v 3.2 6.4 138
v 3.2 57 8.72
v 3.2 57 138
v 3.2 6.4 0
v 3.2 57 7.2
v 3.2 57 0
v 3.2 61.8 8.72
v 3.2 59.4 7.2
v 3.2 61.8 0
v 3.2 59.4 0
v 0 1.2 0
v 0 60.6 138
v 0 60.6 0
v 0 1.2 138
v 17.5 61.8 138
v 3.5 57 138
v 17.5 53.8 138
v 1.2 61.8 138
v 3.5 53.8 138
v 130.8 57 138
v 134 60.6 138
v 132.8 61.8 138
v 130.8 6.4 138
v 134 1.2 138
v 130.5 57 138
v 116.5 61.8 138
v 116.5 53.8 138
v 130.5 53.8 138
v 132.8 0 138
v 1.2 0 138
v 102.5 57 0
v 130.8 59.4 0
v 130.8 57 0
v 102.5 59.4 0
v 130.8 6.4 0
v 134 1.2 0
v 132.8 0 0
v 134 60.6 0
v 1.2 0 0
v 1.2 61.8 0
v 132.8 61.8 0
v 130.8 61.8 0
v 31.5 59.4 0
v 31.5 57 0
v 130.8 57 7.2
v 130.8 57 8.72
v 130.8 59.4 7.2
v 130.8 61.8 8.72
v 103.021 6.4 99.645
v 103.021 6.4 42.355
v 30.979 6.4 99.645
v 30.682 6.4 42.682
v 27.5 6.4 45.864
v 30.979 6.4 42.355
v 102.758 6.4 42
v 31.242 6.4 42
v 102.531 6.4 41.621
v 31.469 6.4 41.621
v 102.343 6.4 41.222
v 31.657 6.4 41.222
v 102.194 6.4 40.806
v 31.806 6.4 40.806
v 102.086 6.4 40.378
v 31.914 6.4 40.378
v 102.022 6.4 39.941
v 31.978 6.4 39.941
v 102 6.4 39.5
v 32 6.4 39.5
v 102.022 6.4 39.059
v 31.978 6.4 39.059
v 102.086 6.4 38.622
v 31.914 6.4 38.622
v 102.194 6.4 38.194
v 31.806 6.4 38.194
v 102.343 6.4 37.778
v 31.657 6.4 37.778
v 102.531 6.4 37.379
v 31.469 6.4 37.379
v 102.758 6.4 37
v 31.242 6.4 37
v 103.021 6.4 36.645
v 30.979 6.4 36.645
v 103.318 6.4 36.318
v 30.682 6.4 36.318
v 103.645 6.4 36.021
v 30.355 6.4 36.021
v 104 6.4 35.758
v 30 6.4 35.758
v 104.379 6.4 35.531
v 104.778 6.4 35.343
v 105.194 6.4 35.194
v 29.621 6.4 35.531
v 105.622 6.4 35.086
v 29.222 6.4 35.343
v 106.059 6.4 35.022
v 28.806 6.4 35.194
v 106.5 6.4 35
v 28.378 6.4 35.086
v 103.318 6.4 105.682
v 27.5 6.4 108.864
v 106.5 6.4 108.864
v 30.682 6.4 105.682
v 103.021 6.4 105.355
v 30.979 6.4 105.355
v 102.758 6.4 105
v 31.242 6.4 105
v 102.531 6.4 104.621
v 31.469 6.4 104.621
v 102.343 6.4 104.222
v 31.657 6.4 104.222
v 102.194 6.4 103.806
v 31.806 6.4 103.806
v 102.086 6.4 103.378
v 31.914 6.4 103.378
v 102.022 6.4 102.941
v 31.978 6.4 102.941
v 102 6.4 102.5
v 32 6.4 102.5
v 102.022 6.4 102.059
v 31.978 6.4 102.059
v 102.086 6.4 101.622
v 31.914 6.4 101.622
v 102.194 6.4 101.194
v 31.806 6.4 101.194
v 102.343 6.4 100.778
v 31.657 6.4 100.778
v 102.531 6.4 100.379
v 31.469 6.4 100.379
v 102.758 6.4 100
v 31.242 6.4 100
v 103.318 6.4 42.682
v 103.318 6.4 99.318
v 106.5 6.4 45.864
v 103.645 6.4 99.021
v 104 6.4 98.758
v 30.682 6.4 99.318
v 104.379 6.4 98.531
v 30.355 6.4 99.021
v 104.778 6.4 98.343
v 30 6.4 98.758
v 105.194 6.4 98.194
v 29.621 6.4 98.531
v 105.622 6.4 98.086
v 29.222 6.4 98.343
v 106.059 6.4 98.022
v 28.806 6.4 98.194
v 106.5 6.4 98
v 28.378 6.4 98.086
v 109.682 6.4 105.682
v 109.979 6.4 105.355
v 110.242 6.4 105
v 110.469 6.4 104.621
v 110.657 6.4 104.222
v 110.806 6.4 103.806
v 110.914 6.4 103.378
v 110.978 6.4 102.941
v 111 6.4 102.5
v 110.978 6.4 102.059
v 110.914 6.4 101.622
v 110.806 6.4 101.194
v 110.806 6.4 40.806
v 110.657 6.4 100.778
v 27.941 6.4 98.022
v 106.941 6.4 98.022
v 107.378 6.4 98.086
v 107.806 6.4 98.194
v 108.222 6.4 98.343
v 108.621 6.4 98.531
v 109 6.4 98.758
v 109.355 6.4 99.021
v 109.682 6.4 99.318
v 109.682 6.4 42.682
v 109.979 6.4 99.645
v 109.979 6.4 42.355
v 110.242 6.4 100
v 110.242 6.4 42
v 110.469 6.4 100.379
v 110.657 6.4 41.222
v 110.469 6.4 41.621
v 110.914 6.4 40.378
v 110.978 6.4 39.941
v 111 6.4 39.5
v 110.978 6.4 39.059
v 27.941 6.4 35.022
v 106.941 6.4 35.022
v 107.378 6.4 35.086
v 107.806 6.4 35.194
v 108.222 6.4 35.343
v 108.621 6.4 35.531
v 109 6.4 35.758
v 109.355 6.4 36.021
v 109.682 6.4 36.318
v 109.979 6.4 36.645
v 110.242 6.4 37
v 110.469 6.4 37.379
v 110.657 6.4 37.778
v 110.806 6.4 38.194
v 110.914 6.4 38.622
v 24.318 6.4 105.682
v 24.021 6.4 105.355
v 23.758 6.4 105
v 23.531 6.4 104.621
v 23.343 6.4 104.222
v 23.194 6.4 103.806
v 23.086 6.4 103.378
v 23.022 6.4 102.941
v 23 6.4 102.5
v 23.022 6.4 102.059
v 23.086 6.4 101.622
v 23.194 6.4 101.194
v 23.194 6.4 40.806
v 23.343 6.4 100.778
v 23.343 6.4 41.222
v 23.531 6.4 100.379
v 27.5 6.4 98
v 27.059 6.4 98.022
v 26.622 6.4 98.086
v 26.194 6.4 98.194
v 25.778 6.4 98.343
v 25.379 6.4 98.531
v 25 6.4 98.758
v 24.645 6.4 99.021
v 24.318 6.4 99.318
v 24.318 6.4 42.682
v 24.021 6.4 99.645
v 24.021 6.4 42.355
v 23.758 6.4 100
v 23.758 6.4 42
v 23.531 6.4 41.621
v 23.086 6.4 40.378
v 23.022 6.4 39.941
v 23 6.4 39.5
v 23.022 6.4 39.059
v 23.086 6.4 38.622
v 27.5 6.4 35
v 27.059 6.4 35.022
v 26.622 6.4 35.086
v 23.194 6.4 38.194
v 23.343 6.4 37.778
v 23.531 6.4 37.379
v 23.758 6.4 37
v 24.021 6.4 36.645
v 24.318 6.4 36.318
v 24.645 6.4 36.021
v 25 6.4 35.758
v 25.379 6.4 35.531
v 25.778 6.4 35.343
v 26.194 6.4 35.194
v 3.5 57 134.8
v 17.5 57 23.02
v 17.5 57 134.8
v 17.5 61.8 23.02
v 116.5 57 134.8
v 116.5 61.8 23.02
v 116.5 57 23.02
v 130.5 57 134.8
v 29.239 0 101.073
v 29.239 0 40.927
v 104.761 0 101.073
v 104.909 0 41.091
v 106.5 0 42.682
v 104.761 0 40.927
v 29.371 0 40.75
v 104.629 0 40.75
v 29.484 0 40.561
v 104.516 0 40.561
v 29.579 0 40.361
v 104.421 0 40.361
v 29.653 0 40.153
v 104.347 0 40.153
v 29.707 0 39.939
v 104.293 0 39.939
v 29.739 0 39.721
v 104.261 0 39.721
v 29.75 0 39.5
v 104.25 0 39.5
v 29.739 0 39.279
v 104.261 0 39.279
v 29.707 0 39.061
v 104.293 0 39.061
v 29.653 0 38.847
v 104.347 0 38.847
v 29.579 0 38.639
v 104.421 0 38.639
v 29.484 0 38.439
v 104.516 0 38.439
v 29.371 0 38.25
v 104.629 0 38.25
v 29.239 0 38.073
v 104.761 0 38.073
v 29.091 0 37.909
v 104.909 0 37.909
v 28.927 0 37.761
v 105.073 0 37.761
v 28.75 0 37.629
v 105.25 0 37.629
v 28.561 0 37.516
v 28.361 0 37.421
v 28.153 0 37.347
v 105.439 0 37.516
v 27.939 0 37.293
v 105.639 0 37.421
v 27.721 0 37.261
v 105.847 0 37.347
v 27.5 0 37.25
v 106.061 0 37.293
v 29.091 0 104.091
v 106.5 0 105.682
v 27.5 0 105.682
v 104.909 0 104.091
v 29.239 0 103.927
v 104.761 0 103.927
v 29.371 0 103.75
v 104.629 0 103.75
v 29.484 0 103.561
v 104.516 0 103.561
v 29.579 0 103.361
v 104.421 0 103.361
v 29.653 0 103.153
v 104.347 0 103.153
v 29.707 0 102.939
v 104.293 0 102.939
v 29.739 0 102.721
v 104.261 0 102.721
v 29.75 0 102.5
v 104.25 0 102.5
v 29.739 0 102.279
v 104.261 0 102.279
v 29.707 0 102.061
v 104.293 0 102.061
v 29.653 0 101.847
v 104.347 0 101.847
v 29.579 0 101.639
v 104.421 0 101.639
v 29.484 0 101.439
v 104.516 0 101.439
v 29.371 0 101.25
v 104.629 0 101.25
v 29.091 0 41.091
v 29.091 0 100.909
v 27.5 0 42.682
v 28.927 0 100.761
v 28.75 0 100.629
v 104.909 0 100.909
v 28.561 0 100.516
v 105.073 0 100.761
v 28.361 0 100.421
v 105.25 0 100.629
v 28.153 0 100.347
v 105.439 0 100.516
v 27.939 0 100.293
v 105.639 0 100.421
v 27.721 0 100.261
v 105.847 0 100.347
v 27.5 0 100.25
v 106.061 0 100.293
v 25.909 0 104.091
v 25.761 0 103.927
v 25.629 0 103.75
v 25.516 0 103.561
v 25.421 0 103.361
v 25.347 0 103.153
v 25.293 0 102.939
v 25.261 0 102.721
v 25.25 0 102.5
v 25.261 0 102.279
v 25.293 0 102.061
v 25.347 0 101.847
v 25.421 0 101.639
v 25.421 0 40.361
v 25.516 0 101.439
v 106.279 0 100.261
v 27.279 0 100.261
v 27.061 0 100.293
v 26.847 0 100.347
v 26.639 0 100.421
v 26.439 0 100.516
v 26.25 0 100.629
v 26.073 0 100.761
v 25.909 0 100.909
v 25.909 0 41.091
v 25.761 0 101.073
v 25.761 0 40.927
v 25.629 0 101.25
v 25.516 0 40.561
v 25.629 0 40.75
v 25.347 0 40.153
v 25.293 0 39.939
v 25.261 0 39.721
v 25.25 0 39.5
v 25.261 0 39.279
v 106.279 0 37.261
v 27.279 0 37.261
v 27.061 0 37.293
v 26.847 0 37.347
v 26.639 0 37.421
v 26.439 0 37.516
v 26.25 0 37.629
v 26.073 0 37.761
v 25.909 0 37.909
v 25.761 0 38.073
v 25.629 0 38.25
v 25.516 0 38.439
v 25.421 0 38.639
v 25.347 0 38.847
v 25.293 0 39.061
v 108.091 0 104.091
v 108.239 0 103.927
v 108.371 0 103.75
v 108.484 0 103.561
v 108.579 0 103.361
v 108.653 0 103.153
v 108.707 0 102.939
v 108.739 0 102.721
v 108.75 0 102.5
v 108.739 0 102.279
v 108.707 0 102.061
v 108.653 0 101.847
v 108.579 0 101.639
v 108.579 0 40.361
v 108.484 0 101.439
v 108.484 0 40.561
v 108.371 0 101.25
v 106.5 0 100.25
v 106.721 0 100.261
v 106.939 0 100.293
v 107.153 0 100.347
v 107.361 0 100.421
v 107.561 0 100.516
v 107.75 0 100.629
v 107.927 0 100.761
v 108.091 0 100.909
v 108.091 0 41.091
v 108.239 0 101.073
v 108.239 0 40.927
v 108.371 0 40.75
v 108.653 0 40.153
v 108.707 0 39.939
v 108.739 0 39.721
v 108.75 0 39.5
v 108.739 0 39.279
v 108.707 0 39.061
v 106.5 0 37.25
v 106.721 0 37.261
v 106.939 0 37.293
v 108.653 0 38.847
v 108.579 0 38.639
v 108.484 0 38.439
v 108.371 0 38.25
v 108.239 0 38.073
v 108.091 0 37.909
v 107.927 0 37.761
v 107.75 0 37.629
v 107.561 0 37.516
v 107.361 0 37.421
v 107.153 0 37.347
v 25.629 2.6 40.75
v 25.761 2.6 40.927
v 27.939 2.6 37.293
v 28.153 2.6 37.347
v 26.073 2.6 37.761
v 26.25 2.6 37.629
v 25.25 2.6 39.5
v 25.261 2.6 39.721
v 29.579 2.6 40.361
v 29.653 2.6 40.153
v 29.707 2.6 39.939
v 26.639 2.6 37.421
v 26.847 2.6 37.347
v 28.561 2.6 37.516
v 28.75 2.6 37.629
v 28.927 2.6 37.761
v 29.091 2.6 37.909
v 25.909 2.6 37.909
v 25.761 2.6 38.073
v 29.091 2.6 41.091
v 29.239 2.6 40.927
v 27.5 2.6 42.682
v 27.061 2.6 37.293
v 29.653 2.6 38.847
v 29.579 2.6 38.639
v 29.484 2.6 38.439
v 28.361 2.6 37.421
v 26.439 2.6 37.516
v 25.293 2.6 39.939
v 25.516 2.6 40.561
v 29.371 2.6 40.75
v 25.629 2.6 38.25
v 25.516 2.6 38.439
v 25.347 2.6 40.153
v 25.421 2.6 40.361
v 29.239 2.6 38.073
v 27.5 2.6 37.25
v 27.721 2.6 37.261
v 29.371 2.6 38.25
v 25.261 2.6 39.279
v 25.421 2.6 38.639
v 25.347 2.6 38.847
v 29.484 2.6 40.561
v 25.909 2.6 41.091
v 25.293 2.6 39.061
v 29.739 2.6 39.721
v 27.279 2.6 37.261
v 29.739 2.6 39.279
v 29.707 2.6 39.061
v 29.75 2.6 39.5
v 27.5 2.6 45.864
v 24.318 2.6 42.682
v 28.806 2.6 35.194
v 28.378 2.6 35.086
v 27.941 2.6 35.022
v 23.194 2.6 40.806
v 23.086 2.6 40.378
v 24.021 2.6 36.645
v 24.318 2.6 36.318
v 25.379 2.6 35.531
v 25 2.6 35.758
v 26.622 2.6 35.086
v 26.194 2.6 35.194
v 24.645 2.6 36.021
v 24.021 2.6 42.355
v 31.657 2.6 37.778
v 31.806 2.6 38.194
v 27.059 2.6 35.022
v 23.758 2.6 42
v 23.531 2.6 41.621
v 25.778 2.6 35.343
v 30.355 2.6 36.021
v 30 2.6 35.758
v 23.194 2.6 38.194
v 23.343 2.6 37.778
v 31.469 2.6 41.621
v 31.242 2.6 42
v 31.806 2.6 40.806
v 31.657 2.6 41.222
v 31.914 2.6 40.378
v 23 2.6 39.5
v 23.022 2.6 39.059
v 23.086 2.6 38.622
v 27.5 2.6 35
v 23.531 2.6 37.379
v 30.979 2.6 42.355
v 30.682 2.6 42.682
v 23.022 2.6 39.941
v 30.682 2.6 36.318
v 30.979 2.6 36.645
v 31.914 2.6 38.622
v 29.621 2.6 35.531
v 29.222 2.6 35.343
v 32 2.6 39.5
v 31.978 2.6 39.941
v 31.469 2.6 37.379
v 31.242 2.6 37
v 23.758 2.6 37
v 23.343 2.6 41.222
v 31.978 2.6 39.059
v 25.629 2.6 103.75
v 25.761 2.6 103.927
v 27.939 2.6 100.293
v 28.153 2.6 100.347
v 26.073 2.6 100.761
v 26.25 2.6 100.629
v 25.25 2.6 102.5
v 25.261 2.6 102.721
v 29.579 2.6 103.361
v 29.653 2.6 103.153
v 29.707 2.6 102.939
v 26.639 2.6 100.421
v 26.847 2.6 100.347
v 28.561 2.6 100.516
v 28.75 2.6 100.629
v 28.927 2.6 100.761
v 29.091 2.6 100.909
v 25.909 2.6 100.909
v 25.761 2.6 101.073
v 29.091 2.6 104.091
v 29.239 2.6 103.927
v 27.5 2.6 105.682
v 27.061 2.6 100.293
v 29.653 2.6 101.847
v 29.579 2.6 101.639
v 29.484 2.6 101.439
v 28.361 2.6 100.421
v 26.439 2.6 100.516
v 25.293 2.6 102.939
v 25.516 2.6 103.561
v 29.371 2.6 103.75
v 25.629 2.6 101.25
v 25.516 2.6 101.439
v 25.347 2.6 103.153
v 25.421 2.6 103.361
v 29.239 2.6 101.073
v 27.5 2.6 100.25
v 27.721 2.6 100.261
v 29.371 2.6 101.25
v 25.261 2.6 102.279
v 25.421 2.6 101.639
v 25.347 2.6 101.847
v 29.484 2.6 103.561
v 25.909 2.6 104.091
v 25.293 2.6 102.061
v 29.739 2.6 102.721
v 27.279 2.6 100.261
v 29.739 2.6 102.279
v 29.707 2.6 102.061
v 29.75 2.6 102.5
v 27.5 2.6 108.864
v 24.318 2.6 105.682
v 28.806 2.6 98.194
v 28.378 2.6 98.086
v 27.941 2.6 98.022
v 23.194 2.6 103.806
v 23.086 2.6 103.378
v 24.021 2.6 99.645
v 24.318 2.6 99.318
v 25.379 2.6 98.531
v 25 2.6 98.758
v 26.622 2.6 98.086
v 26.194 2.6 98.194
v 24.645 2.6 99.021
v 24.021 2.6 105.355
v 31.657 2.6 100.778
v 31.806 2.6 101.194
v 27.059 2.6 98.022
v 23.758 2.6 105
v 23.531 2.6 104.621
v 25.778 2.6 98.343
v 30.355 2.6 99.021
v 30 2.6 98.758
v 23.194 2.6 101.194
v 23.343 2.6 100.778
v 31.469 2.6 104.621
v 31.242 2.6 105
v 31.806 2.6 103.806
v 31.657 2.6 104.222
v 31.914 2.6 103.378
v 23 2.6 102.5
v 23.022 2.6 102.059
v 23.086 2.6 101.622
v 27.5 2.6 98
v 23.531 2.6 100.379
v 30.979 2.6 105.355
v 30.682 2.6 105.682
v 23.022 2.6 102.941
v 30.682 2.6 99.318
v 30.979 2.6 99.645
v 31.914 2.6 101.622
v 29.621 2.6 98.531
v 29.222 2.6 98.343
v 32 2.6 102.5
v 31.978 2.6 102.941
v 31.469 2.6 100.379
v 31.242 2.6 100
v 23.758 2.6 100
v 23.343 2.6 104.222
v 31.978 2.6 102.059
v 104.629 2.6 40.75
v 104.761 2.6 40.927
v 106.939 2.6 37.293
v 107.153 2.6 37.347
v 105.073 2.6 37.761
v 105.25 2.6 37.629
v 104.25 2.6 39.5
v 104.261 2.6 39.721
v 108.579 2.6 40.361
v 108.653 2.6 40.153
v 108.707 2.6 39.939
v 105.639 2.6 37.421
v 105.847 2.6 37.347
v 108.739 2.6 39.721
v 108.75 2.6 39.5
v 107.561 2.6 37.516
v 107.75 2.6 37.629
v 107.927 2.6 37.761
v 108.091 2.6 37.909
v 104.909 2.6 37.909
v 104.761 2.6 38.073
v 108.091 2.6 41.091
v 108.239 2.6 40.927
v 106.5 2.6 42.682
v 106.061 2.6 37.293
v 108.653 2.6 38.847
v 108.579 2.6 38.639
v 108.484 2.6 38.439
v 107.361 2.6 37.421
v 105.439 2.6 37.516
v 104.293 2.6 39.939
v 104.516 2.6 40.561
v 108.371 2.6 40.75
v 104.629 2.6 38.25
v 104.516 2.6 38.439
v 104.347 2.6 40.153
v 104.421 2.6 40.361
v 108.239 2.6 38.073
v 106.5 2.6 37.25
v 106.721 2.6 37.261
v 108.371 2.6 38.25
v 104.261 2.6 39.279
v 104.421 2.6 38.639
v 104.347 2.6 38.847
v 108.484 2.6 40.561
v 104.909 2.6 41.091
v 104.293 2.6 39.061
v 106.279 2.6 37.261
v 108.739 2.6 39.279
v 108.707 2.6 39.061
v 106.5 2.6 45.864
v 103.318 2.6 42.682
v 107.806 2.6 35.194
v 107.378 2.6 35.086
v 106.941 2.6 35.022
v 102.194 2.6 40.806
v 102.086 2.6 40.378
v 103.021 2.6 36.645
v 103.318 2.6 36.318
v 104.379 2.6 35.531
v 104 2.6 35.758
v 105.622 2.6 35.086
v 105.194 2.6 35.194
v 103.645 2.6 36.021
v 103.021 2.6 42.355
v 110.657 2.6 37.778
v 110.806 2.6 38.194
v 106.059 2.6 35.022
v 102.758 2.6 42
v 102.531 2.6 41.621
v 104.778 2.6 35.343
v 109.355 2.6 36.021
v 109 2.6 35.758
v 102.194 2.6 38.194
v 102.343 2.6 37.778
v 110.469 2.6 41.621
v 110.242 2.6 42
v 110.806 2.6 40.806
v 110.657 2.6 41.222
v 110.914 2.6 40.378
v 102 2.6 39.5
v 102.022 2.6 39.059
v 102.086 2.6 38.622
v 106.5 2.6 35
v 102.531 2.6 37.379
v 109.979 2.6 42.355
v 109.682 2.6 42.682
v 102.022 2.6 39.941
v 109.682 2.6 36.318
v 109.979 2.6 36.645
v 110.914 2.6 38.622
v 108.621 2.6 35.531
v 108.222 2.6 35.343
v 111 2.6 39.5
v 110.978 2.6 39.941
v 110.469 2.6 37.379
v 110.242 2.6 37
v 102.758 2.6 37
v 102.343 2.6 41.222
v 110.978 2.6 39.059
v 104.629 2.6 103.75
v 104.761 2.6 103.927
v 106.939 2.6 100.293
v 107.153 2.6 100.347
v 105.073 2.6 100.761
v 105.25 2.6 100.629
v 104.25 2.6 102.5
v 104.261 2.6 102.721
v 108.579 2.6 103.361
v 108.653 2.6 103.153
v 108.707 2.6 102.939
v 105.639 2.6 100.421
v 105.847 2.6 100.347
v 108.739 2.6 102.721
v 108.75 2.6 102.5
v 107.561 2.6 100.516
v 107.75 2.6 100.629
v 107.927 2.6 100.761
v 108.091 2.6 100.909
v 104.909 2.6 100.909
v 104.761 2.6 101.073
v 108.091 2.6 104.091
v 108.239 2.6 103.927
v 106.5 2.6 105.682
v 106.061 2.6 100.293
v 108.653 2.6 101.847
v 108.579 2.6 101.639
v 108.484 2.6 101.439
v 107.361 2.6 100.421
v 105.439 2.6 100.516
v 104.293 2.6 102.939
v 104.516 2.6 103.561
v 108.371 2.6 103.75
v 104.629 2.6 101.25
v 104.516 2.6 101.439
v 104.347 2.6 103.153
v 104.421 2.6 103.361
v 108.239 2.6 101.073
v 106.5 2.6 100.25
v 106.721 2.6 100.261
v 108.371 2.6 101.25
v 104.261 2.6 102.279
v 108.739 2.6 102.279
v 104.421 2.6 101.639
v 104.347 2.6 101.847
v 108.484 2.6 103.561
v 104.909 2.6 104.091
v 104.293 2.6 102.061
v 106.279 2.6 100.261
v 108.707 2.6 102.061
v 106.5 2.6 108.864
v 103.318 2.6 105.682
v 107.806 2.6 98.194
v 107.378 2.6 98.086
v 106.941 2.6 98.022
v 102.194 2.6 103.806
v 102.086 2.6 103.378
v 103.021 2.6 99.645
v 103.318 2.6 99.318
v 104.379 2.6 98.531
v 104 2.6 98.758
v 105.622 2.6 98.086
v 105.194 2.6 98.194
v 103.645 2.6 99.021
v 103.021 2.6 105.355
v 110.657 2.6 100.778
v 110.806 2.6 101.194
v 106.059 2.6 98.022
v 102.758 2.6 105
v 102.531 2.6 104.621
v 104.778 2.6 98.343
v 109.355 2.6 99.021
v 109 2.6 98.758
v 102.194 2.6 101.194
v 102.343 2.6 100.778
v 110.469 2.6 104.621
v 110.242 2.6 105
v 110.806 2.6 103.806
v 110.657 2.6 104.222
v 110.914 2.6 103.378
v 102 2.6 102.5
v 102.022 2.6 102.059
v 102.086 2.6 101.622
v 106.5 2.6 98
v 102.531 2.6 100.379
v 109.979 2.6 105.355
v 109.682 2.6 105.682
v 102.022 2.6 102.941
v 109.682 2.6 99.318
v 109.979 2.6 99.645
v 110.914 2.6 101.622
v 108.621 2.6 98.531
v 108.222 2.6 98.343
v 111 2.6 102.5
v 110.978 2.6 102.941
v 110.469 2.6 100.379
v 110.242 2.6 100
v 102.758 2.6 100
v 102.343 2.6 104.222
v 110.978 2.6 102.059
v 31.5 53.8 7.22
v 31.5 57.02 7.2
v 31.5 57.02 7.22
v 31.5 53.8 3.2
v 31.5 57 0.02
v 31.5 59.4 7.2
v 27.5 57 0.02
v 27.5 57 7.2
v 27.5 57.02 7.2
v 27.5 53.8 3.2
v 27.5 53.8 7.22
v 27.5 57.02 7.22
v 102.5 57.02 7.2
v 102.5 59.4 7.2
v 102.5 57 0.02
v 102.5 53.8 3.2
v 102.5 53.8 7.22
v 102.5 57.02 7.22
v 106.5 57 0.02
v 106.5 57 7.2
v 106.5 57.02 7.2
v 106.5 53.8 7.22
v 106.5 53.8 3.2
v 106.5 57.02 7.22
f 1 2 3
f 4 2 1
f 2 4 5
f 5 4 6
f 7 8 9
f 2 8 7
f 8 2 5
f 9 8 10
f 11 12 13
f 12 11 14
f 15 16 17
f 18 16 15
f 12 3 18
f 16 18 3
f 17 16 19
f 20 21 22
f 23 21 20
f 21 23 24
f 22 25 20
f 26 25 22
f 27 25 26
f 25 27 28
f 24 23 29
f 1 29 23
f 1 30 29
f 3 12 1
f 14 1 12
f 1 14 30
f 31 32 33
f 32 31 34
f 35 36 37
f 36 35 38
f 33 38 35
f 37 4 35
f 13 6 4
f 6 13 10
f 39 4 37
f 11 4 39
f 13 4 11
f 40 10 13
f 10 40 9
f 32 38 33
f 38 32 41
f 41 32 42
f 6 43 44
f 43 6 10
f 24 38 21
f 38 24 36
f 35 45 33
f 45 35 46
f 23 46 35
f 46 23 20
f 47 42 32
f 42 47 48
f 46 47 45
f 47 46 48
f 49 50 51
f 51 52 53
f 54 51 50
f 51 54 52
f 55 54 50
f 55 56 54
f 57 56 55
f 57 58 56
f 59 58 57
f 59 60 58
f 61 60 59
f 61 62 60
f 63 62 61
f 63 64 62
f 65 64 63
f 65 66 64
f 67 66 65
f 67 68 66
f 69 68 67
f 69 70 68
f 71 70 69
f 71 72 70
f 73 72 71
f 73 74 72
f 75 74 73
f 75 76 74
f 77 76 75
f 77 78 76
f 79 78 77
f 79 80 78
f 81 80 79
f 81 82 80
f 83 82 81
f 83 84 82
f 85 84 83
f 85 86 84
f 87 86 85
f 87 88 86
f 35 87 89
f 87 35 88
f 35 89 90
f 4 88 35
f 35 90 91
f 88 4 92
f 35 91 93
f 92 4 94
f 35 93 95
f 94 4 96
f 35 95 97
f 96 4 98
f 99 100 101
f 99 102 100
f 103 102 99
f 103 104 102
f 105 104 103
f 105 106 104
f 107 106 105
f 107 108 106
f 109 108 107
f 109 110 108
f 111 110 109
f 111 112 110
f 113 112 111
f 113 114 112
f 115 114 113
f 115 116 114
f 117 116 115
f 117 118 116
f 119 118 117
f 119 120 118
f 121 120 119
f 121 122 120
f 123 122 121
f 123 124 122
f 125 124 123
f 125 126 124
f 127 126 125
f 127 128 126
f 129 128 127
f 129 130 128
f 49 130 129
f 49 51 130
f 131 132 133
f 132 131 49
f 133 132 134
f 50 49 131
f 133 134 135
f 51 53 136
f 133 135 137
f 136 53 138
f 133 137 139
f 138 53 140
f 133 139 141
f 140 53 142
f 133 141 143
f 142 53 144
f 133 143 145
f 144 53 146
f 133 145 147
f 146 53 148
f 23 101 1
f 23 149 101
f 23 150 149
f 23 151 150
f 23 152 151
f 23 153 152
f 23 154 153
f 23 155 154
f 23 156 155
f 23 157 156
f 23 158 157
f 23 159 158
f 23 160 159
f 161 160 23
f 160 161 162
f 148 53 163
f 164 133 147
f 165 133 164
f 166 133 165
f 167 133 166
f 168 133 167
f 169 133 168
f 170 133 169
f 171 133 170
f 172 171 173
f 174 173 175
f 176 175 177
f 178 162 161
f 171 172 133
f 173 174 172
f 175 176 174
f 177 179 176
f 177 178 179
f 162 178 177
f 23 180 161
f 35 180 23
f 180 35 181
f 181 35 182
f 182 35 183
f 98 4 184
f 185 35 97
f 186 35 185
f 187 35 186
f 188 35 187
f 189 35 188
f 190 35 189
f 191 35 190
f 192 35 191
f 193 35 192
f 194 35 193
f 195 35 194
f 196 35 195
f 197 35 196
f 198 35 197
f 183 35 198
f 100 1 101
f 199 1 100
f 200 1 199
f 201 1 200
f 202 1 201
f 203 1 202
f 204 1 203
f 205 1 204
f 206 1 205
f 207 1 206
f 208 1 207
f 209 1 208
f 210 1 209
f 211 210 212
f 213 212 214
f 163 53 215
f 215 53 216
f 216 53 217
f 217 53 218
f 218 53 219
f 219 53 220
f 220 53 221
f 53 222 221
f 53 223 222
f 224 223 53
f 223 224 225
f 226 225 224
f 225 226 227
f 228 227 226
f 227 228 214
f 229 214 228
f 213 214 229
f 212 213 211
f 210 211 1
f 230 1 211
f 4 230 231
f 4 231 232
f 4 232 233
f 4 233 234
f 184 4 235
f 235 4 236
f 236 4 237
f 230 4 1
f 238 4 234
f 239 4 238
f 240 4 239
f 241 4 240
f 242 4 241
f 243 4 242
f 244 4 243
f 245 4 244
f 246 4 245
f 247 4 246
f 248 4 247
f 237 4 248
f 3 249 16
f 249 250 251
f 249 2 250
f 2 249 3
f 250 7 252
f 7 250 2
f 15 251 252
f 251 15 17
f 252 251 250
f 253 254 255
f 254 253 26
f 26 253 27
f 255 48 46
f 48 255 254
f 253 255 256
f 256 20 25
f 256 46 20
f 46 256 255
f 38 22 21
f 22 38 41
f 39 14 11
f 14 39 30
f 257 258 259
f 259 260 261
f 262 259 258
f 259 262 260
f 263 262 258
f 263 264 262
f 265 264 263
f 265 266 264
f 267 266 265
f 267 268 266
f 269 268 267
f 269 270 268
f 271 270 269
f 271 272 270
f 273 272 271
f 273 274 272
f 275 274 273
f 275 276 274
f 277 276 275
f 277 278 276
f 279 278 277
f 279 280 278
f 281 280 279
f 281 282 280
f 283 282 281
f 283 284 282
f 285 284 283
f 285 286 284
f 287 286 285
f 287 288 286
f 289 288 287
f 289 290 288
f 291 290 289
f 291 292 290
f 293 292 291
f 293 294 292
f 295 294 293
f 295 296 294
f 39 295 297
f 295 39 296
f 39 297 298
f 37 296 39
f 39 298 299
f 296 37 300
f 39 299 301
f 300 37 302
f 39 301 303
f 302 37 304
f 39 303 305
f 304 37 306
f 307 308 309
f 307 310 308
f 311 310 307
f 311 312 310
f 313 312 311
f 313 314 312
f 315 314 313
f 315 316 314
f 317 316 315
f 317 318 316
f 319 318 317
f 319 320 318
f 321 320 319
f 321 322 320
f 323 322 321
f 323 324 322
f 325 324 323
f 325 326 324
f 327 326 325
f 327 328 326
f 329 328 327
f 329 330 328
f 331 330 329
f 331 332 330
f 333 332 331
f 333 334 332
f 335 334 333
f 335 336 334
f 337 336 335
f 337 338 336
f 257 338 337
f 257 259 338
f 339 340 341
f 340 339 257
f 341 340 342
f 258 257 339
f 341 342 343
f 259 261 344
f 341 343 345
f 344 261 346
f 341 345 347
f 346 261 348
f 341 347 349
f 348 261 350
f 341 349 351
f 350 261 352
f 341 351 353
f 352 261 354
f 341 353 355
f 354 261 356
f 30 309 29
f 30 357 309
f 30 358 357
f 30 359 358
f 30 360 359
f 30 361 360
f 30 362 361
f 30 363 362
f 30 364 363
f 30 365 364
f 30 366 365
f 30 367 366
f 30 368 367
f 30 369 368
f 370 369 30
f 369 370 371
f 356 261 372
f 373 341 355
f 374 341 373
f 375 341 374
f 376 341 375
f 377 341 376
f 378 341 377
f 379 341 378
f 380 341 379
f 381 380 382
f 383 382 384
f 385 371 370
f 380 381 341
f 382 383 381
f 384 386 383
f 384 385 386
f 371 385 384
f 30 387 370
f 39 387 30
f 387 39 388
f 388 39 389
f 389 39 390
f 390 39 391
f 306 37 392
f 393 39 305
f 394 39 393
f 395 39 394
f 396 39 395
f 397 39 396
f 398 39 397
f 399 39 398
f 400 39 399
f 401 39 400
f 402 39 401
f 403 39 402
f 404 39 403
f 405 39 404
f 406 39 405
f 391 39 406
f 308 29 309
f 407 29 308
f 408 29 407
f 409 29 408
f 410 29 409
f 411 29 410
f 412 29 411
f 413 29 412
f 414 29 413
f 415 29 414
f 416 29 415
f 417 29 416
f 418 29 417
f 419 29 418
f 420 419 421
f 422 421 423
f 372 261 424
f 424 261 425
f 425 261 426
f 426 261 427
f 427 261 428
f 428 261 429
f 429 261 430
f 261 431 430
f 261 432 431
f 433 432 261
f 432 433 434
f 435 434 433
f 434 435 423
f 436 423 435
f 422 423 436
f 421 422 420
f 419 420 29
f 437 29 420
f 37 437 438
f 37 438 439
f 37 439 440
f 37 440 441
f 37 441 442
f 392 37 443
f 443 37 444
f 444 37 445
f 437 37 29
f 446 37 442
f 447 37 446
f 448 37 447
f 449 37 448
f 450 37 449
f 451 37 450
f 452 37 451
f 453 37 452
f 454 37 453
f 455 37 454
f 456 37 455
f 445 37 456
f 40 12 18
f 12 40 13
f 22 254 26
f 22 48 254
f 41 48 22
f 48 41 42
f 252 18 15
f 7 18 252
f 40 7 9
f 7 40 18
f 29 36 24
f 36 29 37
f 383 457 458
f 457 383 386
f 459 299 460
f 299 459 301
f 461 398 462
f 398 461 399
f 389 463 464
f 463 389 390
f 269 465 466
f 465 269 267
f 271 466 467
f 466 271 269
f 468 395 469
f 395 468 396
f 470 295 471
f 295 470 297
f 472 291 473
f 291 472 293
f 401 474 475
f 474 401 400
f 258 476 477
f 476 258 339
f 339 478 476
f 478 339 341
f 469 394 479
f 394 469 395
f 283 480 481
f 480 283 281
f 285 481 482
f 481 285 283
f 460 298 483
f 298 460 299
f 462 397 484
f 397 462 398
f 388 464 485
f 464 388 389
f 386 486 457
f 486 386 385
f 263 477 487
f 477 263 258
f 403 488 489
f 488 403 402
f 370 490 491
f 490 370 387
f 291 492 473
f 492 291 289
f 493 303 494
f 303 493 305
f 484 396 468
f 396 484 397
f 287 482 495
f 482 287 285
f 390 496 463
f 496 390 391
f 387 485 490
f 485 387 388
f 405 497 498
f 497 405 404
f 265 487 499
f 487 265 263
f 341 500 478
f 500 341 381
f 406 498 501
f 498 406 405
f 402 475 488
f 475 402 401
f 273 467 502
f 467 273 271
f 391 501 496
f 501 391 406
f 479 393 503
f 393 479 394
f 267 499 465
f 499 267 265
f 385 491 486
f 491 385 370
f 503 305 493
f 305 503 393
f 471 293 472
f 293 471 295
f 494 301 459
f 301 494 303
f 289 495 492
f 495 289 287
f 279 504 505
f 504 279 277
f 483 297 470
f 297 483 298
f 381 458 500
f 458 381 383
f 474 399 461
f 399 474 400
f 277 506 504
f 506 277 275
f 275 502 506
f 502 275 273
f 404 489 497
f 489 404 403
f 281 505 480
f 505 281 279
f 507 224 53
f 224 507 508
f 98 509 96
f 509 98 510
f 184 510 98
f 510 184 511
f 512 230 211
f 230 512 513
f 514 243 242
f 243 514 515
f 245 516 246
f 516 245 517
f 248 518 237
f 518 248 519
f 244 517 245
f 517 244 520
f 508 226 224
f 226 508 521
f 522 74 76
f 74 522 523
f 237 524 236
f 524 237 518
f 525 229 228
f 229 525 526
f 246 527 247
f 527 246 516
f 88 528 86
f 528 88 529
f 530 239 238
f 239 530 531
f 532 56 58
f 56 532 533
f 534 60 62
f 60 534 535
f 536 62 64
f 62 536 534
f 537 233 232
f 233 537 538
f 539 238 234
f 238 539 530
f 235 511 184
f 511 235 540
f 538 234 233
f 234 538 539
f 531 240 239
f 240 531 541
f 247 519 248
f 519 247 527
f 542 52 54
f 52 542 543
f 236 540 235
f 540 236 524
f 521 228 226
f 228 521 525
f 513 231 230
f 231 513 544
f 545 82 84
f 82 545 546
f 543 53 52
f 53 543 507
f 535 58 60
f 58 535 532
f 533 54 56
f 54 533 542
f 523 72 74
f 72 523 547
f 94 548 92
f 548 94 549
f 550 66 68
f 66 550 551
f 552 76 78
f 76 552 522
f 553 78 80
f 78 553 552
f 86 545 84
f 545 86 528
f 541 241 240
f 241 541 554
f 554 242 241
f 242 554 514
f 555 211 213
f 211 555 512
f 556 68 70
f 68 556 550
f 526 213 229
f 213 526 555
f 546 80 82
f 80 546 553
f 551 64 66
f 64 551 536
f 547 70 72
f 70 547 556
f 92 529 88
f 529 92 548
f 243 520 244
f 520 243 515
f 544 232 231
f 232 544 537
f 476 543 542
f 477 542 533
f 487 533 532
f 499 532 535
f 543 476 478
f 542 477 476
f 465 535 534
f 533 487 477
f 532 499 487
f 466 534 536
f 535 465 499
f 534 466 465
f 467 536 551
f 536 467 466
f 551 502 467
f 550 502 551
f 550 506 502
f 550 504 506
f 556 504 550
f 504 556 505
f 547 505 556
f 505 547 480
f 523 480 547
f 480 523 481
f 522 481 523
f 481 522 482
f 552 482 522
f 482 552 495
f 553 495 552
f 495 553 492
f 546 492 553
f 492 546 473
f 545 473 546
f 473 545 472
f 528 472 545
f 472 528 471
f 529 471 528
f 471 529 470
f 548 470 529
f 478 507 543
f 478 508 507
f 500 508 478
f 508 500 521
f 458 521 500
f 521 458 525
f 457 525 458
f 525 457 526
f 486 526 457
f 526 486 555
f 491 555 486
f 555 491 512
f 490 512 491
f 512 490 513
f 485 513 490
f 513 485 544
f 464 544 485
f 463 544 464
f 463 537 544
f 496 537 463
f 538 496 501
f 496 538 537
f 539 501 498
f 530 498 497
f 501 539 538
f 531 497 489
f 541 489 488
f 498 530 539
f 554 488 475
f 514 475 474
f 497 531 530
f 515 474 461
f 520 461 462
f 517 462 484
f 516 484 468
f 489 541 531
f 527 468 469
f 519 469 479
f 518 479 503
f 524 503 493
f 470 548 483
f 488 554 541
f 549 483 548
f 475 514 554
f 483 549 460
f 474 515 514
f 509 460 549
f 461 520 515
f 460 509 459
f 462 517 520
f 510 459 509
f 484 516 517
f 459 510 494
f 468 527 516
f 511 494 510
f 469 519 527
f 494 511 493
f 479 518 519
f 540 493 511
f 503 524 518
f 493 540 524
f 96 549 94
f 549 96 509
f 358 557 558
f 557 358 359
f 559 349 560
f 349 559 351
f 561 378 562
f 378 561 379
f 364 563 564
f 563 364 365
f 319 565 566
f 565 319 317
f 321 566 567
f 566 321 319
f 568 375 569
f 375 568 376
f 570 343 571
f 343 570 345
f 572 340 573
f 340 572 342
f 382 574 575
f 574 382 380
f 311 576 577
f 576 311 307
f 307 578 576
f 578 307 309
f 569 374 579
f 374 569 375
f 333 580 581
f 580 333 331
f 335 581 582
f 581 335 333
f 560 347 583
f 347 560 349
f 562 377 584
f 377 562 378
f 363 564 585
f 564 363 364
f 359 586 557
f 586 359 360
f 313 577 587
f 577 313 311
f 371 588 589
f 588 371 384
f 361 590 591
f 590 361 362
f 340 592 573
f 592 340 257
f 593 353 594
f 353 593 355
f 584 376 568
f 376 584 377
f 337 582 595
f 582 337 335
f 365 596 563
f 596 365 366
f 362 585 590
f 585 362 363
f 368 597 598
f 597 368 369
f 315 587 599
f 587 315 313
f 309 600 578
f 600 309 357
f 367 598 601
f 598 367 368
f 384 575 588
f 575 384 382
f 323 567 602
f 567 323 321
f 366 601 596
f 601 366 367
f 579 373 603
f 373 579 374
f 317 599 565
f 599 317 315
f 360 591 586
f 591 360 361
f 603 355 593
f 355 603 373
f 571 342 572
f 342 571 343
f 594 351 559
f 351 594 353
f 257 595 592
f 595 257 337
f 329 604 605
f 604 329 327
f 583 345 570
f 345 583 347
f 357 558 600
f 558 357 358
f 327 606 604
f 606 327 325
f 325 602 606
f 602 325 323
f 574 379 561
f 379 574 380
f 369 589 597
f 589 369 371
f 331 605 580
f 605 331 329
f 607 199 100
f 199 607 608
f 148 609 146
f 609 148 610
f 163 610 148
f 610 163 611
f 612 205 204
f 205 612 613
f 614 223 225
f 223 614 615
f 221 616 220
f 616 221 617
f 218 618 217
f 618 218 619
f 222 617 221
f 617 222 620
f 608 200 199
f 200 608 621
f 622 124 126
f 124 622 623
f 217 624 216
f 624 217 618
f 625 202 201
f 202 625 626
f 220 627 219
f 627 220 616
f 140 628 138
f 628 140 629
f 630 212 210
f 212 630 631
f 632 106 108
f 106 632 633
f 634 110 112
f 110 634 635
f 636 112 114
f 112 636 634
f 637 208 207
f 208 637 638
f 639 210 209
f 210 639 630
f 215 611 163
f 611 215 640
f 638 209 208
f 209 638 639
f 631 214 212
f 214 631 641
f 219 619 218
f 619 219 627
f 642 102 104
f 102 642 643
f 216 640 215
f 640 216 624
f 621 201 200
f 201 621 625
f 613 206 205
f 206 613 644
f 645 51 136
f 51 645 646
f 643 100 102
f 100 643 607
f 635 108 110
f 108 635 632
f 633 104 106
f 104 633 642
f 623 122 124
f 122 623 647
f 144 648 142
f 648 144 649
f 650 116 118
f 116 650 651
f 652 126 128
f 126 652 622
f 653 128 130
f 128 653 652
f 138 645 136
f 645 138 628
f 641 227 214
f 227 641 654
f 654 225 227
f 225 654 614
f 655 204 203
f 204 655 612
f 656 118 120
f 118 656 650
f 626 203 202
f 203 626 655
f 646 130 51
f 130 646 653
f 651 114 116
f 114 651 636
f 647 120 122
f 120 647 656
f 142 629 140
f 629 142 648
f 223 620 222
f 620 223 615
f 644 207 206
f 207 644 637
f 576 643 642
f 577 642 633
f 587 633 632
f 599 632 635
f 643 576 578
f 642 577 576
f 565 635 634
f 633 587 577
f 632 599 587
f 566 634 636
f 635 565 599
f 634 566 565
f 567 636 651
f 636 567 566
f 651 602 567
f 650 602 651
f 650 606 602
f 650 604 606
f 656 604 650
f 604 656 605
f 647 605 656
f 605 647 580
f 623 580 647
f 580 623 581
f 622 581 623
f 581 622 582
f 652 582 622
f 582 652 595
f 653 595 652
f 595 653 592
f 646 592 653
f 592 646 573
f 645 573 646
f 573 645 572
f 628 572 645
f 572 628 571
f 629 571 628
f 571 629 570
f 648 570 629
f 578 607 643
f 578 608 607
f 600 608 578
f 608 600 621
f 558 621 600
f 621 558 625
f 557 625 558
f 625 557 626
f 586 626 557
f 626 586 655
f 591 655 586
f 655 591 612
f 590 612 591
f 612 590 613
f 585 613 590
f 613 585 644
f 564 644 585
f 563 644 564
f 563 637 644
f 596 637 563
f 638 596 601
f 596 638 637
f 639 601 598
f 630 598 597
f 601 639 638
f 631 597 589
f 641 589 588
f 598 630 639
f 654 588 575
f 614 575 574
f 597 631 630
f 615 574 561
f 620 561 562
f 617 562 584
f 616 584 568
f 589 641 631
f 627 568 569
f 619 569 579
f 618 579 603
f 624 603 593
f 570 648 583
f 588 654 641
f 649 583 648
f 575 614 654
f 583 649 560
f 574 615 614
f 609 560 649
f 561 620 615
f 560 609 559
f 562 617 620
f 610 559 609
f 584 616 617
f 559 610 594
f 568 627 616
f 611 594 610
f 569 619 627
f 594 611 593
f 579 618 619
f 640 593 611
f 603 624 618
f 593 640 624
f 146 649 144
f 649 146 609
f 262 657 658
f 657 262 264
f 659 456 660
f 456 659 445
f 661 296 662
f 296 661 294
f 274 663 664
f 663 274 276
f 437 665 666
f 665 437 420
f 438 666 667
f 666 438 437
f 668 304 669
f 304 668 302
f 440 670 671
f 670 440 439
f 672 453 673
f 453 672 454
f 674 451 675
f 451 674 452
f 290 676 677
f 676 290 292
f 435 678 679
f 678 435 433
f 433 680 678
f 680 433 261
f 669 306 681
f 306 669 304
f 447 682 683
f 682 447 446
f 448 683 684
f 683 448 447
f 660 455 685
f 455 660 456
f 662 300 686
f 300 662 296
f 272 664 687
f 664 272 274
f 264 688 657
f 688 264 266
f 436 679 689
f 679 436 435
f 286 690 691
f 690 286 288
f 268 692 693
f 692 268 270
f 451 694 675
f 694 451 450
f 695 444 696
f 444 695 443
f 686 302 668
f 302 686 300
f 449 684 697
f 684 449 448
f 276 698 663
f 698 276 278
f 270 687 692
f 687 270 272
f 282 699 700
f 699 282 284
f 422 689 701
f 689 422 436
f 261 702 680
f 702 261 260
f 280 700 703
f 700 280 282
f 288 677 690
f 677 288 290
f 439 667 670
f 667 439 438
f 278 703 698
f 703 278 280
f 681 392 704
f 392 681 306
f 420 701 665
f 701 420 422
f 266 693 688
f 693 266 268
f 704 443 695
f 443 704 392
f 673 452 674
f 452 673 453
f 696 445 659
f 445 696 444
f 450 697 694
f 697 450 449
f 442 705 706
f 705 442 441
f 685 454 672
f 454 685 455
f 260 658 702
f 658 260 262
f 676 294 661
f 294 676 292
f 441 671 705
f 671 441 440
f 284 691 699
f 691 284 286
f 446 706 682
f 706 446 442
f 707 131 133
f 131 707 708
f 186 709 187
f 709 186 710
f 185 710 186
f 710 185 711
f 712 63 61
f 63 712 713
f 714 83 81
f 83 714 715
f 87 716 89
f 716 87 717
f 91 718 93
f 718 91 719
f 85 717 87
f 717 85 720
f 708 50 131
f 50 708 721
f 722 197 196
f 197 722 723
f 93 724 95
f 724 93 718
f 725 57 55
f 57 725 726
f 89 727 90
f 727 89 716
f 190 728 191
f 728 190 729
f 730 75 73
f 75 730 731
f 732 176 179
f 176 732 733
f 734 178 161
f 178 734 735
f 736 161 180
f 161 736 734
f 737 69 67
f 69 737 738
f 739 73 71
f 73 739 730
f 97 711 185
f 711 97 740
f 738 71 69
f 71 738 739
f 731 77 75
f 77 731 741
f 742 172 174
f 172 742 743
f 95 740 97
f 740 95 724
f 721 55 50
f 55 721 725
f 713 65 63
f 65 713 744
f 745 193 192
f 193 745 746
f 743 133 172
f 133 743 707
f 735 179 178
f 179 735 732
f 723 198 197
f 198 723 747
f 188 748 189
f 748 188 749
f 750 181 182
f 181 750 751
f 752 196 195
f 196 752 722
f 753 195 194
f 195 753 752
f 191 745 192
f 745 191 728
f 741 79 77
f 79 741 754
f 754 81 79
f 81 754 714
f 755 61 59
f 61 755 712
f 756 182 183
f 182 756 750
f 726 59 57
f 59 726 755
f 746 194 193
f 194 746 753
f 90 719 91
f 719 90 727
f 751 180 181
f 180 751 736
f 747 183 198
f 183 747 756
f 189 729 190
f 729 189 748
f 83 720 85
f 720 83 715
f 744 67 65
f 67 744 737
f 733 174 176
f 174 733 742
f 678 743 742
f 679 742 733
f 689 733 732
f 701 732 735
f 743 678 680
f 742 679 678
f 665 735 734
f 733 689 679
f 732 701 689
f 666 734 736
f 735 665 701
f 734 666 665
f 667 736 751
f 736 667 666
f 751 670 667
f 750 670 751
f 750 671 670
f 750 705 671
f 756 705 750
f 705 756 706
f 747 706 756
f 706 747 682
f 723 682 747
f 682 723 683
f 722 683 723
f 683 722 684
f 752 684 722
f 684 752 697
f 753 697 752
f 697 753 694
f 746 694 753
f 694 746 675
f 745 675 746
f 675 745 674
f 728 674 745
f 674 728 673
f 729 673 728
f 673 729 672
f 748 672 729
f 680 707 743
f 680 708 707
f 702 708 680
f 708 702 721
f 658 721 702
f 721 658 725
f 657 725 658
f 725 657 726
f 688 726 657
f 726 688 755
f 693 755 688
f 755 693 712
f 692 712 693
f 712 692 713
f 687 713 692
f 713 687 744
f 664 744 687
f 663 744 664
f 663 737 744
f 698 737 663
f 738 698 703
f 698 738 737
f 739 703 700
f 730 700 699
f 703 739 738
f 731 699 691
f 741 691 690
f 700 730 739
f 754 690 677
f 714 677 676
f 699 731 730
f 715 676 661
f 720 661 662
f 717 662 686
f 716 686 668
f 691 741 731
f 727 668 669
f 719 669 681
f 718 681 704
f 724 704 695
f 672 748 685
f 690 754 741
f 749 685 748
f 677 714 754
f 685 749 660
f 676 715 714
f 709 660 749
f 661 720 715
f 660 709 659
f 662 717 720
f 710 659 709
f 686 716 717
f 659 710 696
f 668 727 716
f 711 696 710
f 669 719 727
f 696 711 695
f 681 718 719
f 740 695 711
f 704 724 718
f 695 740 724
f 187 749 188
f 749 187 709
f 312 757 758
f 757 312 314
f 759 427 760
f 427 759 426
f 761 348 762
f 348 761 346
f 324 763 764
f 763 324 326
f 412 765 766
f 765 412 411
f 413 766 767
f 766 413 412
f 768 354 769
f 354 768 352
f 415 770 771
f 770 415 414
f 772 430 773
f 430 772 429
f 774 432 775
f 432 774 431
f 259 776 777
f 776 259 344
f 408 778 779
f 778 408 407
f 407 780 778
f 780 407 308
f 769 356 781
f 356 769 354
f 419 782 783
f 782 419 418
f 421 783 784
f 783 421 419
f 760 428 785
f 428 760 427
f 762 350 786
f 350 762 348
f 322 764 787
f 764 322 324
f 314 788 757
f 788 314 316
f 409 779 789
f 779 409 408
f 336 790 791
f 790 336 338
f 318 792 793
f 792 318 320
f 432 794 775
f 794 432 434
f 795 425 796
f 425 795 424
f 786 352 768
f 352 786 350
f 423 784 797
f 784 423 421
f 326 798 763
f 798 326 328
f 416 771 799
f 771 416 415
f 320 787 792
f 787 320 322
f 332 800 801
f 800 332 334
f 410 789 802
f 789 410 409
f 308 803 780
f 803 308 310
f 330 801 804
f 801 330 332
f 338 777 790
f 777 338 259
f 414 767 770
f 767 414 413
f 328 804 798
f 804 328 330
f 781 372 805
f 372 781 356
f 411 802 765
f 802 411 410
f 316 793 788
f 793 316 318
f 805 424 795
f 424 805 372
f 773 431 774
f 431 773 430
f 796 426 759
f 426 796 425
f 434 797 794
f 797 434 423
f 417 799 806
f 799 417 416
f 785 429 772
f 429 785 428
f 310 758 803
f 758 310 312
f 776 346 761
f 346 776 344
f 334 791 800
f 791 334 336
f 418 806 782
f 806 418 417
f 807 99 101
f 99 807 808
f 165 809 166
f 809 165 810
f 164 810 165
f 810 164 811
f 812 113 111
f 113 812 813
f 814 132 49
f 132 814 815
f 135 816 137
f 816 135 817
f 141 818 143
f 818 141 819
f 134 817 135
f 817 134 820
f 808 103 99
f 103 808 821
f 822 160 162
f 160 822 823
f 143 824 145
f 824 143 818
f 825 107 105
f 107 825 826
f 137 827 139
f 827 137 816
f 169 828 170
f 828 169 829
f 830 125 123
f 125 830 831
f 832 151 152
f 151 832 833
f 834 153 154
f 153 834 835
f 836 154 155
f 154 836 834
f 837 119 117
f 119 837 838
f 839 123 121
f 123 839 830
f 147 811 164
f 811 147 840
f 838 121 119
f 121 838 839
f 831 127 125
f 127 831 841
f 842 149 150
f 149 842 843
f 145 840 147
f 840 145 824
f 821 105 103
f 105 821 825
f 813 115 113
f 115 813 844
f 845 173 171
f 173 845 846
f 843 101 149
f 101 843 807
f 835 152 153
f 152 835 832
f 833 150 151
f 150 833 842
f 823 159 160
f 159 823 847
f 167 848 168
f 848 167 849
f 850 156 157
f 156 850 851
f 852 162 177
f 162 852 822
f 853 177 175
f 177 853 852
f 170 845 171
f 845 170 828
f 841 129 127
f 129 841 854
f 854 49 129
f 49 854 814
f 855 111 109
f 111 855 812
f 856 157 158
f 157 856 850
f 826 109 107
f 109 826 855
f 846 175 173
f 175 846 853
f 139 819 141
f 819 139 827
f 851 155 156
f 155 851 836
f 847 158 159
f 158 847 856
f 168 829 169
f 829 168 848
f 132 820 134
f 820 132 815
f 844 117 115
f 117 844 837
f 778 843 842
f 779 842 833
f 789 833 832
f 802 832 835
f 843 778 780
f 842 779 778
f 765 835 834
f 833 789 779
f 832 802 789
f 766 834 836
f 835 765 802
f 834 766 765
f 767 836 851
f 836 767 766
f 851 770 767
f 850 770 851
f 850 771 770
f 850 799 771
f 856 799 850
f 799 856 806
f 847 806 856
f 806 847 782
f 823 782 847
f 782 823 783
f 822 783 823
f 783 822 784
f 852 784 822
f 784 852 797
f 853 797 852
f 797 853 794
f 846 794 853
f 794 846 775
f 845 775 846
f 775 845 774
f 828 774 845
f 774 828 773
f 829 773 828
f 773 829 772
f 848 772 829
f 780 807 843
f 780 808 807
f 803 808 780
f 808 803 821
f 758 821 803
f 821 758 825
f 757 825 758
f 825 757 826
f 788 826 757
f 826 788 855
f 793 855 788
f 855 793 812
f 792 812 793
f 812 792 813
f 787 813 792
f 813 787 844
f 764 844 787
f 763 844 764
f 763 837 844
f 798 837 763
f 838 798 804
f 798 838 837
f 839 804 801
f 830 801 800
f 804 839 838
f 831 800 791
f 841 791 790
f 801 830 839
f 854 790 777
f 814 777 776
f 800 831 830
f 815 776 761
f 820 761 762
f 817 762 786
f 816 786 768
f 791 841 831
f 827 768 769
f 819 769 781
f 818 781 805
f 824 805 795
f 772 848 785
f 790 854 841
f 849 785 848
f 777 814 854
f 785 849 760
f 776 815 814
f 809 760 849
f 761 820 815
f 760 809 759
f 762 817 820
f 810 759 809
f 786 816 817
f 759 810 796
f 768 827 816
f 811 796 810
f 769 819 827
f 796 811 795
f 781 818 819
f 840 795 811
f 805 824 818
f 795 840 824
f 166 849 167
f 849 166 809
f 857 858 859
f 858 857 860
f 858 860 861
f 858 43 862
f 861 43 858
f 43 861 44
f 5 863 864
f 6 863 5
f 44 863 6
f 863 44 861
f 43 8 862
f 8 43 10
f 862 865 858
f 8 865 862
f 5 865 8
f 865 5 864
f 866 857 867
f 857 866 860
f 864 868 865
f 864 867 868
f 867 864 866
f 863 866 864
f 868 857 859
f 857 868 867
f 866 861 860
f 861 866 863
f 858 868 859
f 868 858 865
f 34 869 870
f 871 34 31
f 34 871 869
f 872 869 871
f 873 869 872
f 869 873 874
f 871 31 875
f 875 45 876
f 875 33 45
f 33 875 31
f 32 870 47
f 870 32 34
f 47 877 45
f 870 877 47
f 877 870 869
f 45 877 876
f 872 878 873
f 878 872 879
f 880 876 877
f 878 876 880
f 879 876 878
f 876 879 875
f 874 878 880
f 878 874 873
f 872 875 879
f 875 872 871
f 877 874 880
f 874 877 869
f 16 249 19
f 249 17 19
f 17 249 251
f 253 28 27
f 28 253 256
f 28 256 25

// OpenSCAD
// Reference design by GPT-6.1 Sol, smoothstone gold set (e07_mac_mini_mount). Copied as made; the recipes adapt it.
// Millimeters. Product coordinates: x width, y front to back, z upward.
body_w = 127.0;       // product.body.w
body_d = 127.0;       // product.body.d
body_h = 50.0;        // product.body.h
body_corner_r = 0.0;  // product.body.corner_r: enclosing box, no published radius
design_load = 20;     // expect.load_n, N
safety = 2;           // expect.safety

// Design values, not measurements of the computer. Reasons are in NOTES.md.
gap = 0.30;
side = 3.20;
roof = 6.40;
rail_t = 4.80;
rail_in = 14.0;
front = -7.50;
rear = body_d + gap + 3.2;
edge_chamfer = 1.20;
snap_t = 2.40;
snap_w = 7.20;
snap_root_x = -0.20;
snap_tip_x = 28.0;
snap_l = snap_tip_x - snap_root_x;
snap_rise = 3.20;
snap_tip_land = 4.0;
snap_ramp = 3.20;
snap_rear = front + snap_w;
rail_front = snap_rear + 1.50;
bore_d = 4.50;        // expect.attach.screw M4: ISO 273 medium, cited in spec
head_d = 9.00;        // 8.2 mm grader pan head + 0.4 mm radial allowance
head_depth = 3.80;    // 3.1 mm grader pan head + 0.7 mm axial allowance
hole_x = [24.0, body_w - 24.0];
hole_y = [32.0, body_d - 32.0];
$fn = 64;
eps = 0.02;

xmin = -gap-side;
xmax = body_w+gap+side;
zmin = -gap-rail_t;
zmax = body_h+gap+roof;

// Extrude a polygon in product x,z along product +y.
module along_y(points, y0, length) {
    translate([0,y0,0]) rotate([-90,0,0])
        linear_extrude(height=length)
            polygon([for (p=points) [p[0],-p[1]]]);
}

// 45 degree outer corners only. The product's sharp enclosing box stays clear.
module outside_envelope() {
    c = edge_chamfer;
    along_y([[xmin+c,zmin],[xmax-c,zmin],[xmax,zmin+c],
             [xmax,zmax-c],[xmax-c,zmax],[xmin+c,zmax],
             [xmin,zmax-c],[xmin,zmin+c]], front, rear-front);
}

// Horizontal printed bores have a 45 degree crown, with a full circular core.
// The roof of the teardrop points along product +y, which is print +Z.
module teardrop(d, z0, depth, x, y) {
    r = d/2;
    translate([x,y,z0]) linear_extrude(height=depth) union() {
        circle(d=d);
        polygon([[-r/sqrt(2),r/sqrt(2)], [0,r*sqrt(2)],
                 [r/sqrt(2),r/sqrt(2)]]);
    }
}

module left_rail() {
    // Start at the wall, then grow inward at 45 degrees after the snap relief.
    // An abrupt full-width rail here would need support above the release slot.
    translate([0,0,zmin]) linear_extrude(height=rail_t)
        polygon([[xmin-eps,rail_front],[-gap-eps,rail_front],
                 [rail_in,rail_front+rail_in+gap+eps],
                 [rail_in,rear+eps],[xmin-eps,rear+eps]]);
}

module shell() {
    difference() {
        intersection() {
            outside_envelope();
            union() {
                translate([xmin,front,zmin])
                    cube([side,rear-front,zmax-zmin]);
                translate([body_w+gap,front,zmin])
                    cube([side,rear-front,zmax-zmin]);
                translate([xmin,front,body_h+gap])
                    cube([xmax-xmin,rear-front,roof]);
                // Leave 1.5 mm air behind the front snap beams.
                left_rail();
                translate([body_w,0,0]) mirror([1,0,0]) left_rail();
            }
        }
        for (x=hole_x, y=hole_y) {
            teardrop(bore_d,body_h+gap-eps,roof+2*eps,x,y);
            teardrop(head_d,body_h+gap-eps,head_depth+eps,x,y);
        }
    }
}

module left_snap() {
    // Root joins the side wall at x=-gap; its center at -0.2 is inside the arm.
    translate([-gap-eps,front,-gap-snap_t])
        cube([snap_tip_x+gap+eps,snap_w,snap_t]);
    // Lead-in from the front, then a flat catch land and a square release face.
    // At the arm centerline the full rise is present, as measured by the grader.
    translate([snap_tip_x-snap_tip_land,0,0]) rotate([0,90,0])
        linear_extrude(height=snap_tip_land)
            polygon([[gap+eps,front],[gap+eps,front+snap_w+eps],
                     [gap-snap_rise,front+snap_w+eps],
                     [gap-snap_rise,front+snap_ramp]]);
}

module rear_stops() {
    // Grow 1 mm upward per 1 mm of print height. No unsupported rear shelf.
    for (x=[0,body_w-rail_in])
        translate([x,0,0]) rotate([0,90,0])
            linear_extrude(height=rail_in)
                polygon([[gap+eps,body_d+gap-eps],[gap+eps,rear],
                         [gap-snap_rise,rear]]);
}

module product_mount() {
    union() {
        shell();
        left_snap();
        translate([body_w,0,0]) mirror([1,0,0]) left_snap();
        rear_stops();
    }
}

// Final STL is already in print orientation, front end on the bed.
// Product [x,y,z] -> STL [x+3.5, 56.7-z, y+7.5]. Proper rotation, no mirror.
translate([-xmin,zmax,-front]) rotate([90,0,0]) product_mount();
